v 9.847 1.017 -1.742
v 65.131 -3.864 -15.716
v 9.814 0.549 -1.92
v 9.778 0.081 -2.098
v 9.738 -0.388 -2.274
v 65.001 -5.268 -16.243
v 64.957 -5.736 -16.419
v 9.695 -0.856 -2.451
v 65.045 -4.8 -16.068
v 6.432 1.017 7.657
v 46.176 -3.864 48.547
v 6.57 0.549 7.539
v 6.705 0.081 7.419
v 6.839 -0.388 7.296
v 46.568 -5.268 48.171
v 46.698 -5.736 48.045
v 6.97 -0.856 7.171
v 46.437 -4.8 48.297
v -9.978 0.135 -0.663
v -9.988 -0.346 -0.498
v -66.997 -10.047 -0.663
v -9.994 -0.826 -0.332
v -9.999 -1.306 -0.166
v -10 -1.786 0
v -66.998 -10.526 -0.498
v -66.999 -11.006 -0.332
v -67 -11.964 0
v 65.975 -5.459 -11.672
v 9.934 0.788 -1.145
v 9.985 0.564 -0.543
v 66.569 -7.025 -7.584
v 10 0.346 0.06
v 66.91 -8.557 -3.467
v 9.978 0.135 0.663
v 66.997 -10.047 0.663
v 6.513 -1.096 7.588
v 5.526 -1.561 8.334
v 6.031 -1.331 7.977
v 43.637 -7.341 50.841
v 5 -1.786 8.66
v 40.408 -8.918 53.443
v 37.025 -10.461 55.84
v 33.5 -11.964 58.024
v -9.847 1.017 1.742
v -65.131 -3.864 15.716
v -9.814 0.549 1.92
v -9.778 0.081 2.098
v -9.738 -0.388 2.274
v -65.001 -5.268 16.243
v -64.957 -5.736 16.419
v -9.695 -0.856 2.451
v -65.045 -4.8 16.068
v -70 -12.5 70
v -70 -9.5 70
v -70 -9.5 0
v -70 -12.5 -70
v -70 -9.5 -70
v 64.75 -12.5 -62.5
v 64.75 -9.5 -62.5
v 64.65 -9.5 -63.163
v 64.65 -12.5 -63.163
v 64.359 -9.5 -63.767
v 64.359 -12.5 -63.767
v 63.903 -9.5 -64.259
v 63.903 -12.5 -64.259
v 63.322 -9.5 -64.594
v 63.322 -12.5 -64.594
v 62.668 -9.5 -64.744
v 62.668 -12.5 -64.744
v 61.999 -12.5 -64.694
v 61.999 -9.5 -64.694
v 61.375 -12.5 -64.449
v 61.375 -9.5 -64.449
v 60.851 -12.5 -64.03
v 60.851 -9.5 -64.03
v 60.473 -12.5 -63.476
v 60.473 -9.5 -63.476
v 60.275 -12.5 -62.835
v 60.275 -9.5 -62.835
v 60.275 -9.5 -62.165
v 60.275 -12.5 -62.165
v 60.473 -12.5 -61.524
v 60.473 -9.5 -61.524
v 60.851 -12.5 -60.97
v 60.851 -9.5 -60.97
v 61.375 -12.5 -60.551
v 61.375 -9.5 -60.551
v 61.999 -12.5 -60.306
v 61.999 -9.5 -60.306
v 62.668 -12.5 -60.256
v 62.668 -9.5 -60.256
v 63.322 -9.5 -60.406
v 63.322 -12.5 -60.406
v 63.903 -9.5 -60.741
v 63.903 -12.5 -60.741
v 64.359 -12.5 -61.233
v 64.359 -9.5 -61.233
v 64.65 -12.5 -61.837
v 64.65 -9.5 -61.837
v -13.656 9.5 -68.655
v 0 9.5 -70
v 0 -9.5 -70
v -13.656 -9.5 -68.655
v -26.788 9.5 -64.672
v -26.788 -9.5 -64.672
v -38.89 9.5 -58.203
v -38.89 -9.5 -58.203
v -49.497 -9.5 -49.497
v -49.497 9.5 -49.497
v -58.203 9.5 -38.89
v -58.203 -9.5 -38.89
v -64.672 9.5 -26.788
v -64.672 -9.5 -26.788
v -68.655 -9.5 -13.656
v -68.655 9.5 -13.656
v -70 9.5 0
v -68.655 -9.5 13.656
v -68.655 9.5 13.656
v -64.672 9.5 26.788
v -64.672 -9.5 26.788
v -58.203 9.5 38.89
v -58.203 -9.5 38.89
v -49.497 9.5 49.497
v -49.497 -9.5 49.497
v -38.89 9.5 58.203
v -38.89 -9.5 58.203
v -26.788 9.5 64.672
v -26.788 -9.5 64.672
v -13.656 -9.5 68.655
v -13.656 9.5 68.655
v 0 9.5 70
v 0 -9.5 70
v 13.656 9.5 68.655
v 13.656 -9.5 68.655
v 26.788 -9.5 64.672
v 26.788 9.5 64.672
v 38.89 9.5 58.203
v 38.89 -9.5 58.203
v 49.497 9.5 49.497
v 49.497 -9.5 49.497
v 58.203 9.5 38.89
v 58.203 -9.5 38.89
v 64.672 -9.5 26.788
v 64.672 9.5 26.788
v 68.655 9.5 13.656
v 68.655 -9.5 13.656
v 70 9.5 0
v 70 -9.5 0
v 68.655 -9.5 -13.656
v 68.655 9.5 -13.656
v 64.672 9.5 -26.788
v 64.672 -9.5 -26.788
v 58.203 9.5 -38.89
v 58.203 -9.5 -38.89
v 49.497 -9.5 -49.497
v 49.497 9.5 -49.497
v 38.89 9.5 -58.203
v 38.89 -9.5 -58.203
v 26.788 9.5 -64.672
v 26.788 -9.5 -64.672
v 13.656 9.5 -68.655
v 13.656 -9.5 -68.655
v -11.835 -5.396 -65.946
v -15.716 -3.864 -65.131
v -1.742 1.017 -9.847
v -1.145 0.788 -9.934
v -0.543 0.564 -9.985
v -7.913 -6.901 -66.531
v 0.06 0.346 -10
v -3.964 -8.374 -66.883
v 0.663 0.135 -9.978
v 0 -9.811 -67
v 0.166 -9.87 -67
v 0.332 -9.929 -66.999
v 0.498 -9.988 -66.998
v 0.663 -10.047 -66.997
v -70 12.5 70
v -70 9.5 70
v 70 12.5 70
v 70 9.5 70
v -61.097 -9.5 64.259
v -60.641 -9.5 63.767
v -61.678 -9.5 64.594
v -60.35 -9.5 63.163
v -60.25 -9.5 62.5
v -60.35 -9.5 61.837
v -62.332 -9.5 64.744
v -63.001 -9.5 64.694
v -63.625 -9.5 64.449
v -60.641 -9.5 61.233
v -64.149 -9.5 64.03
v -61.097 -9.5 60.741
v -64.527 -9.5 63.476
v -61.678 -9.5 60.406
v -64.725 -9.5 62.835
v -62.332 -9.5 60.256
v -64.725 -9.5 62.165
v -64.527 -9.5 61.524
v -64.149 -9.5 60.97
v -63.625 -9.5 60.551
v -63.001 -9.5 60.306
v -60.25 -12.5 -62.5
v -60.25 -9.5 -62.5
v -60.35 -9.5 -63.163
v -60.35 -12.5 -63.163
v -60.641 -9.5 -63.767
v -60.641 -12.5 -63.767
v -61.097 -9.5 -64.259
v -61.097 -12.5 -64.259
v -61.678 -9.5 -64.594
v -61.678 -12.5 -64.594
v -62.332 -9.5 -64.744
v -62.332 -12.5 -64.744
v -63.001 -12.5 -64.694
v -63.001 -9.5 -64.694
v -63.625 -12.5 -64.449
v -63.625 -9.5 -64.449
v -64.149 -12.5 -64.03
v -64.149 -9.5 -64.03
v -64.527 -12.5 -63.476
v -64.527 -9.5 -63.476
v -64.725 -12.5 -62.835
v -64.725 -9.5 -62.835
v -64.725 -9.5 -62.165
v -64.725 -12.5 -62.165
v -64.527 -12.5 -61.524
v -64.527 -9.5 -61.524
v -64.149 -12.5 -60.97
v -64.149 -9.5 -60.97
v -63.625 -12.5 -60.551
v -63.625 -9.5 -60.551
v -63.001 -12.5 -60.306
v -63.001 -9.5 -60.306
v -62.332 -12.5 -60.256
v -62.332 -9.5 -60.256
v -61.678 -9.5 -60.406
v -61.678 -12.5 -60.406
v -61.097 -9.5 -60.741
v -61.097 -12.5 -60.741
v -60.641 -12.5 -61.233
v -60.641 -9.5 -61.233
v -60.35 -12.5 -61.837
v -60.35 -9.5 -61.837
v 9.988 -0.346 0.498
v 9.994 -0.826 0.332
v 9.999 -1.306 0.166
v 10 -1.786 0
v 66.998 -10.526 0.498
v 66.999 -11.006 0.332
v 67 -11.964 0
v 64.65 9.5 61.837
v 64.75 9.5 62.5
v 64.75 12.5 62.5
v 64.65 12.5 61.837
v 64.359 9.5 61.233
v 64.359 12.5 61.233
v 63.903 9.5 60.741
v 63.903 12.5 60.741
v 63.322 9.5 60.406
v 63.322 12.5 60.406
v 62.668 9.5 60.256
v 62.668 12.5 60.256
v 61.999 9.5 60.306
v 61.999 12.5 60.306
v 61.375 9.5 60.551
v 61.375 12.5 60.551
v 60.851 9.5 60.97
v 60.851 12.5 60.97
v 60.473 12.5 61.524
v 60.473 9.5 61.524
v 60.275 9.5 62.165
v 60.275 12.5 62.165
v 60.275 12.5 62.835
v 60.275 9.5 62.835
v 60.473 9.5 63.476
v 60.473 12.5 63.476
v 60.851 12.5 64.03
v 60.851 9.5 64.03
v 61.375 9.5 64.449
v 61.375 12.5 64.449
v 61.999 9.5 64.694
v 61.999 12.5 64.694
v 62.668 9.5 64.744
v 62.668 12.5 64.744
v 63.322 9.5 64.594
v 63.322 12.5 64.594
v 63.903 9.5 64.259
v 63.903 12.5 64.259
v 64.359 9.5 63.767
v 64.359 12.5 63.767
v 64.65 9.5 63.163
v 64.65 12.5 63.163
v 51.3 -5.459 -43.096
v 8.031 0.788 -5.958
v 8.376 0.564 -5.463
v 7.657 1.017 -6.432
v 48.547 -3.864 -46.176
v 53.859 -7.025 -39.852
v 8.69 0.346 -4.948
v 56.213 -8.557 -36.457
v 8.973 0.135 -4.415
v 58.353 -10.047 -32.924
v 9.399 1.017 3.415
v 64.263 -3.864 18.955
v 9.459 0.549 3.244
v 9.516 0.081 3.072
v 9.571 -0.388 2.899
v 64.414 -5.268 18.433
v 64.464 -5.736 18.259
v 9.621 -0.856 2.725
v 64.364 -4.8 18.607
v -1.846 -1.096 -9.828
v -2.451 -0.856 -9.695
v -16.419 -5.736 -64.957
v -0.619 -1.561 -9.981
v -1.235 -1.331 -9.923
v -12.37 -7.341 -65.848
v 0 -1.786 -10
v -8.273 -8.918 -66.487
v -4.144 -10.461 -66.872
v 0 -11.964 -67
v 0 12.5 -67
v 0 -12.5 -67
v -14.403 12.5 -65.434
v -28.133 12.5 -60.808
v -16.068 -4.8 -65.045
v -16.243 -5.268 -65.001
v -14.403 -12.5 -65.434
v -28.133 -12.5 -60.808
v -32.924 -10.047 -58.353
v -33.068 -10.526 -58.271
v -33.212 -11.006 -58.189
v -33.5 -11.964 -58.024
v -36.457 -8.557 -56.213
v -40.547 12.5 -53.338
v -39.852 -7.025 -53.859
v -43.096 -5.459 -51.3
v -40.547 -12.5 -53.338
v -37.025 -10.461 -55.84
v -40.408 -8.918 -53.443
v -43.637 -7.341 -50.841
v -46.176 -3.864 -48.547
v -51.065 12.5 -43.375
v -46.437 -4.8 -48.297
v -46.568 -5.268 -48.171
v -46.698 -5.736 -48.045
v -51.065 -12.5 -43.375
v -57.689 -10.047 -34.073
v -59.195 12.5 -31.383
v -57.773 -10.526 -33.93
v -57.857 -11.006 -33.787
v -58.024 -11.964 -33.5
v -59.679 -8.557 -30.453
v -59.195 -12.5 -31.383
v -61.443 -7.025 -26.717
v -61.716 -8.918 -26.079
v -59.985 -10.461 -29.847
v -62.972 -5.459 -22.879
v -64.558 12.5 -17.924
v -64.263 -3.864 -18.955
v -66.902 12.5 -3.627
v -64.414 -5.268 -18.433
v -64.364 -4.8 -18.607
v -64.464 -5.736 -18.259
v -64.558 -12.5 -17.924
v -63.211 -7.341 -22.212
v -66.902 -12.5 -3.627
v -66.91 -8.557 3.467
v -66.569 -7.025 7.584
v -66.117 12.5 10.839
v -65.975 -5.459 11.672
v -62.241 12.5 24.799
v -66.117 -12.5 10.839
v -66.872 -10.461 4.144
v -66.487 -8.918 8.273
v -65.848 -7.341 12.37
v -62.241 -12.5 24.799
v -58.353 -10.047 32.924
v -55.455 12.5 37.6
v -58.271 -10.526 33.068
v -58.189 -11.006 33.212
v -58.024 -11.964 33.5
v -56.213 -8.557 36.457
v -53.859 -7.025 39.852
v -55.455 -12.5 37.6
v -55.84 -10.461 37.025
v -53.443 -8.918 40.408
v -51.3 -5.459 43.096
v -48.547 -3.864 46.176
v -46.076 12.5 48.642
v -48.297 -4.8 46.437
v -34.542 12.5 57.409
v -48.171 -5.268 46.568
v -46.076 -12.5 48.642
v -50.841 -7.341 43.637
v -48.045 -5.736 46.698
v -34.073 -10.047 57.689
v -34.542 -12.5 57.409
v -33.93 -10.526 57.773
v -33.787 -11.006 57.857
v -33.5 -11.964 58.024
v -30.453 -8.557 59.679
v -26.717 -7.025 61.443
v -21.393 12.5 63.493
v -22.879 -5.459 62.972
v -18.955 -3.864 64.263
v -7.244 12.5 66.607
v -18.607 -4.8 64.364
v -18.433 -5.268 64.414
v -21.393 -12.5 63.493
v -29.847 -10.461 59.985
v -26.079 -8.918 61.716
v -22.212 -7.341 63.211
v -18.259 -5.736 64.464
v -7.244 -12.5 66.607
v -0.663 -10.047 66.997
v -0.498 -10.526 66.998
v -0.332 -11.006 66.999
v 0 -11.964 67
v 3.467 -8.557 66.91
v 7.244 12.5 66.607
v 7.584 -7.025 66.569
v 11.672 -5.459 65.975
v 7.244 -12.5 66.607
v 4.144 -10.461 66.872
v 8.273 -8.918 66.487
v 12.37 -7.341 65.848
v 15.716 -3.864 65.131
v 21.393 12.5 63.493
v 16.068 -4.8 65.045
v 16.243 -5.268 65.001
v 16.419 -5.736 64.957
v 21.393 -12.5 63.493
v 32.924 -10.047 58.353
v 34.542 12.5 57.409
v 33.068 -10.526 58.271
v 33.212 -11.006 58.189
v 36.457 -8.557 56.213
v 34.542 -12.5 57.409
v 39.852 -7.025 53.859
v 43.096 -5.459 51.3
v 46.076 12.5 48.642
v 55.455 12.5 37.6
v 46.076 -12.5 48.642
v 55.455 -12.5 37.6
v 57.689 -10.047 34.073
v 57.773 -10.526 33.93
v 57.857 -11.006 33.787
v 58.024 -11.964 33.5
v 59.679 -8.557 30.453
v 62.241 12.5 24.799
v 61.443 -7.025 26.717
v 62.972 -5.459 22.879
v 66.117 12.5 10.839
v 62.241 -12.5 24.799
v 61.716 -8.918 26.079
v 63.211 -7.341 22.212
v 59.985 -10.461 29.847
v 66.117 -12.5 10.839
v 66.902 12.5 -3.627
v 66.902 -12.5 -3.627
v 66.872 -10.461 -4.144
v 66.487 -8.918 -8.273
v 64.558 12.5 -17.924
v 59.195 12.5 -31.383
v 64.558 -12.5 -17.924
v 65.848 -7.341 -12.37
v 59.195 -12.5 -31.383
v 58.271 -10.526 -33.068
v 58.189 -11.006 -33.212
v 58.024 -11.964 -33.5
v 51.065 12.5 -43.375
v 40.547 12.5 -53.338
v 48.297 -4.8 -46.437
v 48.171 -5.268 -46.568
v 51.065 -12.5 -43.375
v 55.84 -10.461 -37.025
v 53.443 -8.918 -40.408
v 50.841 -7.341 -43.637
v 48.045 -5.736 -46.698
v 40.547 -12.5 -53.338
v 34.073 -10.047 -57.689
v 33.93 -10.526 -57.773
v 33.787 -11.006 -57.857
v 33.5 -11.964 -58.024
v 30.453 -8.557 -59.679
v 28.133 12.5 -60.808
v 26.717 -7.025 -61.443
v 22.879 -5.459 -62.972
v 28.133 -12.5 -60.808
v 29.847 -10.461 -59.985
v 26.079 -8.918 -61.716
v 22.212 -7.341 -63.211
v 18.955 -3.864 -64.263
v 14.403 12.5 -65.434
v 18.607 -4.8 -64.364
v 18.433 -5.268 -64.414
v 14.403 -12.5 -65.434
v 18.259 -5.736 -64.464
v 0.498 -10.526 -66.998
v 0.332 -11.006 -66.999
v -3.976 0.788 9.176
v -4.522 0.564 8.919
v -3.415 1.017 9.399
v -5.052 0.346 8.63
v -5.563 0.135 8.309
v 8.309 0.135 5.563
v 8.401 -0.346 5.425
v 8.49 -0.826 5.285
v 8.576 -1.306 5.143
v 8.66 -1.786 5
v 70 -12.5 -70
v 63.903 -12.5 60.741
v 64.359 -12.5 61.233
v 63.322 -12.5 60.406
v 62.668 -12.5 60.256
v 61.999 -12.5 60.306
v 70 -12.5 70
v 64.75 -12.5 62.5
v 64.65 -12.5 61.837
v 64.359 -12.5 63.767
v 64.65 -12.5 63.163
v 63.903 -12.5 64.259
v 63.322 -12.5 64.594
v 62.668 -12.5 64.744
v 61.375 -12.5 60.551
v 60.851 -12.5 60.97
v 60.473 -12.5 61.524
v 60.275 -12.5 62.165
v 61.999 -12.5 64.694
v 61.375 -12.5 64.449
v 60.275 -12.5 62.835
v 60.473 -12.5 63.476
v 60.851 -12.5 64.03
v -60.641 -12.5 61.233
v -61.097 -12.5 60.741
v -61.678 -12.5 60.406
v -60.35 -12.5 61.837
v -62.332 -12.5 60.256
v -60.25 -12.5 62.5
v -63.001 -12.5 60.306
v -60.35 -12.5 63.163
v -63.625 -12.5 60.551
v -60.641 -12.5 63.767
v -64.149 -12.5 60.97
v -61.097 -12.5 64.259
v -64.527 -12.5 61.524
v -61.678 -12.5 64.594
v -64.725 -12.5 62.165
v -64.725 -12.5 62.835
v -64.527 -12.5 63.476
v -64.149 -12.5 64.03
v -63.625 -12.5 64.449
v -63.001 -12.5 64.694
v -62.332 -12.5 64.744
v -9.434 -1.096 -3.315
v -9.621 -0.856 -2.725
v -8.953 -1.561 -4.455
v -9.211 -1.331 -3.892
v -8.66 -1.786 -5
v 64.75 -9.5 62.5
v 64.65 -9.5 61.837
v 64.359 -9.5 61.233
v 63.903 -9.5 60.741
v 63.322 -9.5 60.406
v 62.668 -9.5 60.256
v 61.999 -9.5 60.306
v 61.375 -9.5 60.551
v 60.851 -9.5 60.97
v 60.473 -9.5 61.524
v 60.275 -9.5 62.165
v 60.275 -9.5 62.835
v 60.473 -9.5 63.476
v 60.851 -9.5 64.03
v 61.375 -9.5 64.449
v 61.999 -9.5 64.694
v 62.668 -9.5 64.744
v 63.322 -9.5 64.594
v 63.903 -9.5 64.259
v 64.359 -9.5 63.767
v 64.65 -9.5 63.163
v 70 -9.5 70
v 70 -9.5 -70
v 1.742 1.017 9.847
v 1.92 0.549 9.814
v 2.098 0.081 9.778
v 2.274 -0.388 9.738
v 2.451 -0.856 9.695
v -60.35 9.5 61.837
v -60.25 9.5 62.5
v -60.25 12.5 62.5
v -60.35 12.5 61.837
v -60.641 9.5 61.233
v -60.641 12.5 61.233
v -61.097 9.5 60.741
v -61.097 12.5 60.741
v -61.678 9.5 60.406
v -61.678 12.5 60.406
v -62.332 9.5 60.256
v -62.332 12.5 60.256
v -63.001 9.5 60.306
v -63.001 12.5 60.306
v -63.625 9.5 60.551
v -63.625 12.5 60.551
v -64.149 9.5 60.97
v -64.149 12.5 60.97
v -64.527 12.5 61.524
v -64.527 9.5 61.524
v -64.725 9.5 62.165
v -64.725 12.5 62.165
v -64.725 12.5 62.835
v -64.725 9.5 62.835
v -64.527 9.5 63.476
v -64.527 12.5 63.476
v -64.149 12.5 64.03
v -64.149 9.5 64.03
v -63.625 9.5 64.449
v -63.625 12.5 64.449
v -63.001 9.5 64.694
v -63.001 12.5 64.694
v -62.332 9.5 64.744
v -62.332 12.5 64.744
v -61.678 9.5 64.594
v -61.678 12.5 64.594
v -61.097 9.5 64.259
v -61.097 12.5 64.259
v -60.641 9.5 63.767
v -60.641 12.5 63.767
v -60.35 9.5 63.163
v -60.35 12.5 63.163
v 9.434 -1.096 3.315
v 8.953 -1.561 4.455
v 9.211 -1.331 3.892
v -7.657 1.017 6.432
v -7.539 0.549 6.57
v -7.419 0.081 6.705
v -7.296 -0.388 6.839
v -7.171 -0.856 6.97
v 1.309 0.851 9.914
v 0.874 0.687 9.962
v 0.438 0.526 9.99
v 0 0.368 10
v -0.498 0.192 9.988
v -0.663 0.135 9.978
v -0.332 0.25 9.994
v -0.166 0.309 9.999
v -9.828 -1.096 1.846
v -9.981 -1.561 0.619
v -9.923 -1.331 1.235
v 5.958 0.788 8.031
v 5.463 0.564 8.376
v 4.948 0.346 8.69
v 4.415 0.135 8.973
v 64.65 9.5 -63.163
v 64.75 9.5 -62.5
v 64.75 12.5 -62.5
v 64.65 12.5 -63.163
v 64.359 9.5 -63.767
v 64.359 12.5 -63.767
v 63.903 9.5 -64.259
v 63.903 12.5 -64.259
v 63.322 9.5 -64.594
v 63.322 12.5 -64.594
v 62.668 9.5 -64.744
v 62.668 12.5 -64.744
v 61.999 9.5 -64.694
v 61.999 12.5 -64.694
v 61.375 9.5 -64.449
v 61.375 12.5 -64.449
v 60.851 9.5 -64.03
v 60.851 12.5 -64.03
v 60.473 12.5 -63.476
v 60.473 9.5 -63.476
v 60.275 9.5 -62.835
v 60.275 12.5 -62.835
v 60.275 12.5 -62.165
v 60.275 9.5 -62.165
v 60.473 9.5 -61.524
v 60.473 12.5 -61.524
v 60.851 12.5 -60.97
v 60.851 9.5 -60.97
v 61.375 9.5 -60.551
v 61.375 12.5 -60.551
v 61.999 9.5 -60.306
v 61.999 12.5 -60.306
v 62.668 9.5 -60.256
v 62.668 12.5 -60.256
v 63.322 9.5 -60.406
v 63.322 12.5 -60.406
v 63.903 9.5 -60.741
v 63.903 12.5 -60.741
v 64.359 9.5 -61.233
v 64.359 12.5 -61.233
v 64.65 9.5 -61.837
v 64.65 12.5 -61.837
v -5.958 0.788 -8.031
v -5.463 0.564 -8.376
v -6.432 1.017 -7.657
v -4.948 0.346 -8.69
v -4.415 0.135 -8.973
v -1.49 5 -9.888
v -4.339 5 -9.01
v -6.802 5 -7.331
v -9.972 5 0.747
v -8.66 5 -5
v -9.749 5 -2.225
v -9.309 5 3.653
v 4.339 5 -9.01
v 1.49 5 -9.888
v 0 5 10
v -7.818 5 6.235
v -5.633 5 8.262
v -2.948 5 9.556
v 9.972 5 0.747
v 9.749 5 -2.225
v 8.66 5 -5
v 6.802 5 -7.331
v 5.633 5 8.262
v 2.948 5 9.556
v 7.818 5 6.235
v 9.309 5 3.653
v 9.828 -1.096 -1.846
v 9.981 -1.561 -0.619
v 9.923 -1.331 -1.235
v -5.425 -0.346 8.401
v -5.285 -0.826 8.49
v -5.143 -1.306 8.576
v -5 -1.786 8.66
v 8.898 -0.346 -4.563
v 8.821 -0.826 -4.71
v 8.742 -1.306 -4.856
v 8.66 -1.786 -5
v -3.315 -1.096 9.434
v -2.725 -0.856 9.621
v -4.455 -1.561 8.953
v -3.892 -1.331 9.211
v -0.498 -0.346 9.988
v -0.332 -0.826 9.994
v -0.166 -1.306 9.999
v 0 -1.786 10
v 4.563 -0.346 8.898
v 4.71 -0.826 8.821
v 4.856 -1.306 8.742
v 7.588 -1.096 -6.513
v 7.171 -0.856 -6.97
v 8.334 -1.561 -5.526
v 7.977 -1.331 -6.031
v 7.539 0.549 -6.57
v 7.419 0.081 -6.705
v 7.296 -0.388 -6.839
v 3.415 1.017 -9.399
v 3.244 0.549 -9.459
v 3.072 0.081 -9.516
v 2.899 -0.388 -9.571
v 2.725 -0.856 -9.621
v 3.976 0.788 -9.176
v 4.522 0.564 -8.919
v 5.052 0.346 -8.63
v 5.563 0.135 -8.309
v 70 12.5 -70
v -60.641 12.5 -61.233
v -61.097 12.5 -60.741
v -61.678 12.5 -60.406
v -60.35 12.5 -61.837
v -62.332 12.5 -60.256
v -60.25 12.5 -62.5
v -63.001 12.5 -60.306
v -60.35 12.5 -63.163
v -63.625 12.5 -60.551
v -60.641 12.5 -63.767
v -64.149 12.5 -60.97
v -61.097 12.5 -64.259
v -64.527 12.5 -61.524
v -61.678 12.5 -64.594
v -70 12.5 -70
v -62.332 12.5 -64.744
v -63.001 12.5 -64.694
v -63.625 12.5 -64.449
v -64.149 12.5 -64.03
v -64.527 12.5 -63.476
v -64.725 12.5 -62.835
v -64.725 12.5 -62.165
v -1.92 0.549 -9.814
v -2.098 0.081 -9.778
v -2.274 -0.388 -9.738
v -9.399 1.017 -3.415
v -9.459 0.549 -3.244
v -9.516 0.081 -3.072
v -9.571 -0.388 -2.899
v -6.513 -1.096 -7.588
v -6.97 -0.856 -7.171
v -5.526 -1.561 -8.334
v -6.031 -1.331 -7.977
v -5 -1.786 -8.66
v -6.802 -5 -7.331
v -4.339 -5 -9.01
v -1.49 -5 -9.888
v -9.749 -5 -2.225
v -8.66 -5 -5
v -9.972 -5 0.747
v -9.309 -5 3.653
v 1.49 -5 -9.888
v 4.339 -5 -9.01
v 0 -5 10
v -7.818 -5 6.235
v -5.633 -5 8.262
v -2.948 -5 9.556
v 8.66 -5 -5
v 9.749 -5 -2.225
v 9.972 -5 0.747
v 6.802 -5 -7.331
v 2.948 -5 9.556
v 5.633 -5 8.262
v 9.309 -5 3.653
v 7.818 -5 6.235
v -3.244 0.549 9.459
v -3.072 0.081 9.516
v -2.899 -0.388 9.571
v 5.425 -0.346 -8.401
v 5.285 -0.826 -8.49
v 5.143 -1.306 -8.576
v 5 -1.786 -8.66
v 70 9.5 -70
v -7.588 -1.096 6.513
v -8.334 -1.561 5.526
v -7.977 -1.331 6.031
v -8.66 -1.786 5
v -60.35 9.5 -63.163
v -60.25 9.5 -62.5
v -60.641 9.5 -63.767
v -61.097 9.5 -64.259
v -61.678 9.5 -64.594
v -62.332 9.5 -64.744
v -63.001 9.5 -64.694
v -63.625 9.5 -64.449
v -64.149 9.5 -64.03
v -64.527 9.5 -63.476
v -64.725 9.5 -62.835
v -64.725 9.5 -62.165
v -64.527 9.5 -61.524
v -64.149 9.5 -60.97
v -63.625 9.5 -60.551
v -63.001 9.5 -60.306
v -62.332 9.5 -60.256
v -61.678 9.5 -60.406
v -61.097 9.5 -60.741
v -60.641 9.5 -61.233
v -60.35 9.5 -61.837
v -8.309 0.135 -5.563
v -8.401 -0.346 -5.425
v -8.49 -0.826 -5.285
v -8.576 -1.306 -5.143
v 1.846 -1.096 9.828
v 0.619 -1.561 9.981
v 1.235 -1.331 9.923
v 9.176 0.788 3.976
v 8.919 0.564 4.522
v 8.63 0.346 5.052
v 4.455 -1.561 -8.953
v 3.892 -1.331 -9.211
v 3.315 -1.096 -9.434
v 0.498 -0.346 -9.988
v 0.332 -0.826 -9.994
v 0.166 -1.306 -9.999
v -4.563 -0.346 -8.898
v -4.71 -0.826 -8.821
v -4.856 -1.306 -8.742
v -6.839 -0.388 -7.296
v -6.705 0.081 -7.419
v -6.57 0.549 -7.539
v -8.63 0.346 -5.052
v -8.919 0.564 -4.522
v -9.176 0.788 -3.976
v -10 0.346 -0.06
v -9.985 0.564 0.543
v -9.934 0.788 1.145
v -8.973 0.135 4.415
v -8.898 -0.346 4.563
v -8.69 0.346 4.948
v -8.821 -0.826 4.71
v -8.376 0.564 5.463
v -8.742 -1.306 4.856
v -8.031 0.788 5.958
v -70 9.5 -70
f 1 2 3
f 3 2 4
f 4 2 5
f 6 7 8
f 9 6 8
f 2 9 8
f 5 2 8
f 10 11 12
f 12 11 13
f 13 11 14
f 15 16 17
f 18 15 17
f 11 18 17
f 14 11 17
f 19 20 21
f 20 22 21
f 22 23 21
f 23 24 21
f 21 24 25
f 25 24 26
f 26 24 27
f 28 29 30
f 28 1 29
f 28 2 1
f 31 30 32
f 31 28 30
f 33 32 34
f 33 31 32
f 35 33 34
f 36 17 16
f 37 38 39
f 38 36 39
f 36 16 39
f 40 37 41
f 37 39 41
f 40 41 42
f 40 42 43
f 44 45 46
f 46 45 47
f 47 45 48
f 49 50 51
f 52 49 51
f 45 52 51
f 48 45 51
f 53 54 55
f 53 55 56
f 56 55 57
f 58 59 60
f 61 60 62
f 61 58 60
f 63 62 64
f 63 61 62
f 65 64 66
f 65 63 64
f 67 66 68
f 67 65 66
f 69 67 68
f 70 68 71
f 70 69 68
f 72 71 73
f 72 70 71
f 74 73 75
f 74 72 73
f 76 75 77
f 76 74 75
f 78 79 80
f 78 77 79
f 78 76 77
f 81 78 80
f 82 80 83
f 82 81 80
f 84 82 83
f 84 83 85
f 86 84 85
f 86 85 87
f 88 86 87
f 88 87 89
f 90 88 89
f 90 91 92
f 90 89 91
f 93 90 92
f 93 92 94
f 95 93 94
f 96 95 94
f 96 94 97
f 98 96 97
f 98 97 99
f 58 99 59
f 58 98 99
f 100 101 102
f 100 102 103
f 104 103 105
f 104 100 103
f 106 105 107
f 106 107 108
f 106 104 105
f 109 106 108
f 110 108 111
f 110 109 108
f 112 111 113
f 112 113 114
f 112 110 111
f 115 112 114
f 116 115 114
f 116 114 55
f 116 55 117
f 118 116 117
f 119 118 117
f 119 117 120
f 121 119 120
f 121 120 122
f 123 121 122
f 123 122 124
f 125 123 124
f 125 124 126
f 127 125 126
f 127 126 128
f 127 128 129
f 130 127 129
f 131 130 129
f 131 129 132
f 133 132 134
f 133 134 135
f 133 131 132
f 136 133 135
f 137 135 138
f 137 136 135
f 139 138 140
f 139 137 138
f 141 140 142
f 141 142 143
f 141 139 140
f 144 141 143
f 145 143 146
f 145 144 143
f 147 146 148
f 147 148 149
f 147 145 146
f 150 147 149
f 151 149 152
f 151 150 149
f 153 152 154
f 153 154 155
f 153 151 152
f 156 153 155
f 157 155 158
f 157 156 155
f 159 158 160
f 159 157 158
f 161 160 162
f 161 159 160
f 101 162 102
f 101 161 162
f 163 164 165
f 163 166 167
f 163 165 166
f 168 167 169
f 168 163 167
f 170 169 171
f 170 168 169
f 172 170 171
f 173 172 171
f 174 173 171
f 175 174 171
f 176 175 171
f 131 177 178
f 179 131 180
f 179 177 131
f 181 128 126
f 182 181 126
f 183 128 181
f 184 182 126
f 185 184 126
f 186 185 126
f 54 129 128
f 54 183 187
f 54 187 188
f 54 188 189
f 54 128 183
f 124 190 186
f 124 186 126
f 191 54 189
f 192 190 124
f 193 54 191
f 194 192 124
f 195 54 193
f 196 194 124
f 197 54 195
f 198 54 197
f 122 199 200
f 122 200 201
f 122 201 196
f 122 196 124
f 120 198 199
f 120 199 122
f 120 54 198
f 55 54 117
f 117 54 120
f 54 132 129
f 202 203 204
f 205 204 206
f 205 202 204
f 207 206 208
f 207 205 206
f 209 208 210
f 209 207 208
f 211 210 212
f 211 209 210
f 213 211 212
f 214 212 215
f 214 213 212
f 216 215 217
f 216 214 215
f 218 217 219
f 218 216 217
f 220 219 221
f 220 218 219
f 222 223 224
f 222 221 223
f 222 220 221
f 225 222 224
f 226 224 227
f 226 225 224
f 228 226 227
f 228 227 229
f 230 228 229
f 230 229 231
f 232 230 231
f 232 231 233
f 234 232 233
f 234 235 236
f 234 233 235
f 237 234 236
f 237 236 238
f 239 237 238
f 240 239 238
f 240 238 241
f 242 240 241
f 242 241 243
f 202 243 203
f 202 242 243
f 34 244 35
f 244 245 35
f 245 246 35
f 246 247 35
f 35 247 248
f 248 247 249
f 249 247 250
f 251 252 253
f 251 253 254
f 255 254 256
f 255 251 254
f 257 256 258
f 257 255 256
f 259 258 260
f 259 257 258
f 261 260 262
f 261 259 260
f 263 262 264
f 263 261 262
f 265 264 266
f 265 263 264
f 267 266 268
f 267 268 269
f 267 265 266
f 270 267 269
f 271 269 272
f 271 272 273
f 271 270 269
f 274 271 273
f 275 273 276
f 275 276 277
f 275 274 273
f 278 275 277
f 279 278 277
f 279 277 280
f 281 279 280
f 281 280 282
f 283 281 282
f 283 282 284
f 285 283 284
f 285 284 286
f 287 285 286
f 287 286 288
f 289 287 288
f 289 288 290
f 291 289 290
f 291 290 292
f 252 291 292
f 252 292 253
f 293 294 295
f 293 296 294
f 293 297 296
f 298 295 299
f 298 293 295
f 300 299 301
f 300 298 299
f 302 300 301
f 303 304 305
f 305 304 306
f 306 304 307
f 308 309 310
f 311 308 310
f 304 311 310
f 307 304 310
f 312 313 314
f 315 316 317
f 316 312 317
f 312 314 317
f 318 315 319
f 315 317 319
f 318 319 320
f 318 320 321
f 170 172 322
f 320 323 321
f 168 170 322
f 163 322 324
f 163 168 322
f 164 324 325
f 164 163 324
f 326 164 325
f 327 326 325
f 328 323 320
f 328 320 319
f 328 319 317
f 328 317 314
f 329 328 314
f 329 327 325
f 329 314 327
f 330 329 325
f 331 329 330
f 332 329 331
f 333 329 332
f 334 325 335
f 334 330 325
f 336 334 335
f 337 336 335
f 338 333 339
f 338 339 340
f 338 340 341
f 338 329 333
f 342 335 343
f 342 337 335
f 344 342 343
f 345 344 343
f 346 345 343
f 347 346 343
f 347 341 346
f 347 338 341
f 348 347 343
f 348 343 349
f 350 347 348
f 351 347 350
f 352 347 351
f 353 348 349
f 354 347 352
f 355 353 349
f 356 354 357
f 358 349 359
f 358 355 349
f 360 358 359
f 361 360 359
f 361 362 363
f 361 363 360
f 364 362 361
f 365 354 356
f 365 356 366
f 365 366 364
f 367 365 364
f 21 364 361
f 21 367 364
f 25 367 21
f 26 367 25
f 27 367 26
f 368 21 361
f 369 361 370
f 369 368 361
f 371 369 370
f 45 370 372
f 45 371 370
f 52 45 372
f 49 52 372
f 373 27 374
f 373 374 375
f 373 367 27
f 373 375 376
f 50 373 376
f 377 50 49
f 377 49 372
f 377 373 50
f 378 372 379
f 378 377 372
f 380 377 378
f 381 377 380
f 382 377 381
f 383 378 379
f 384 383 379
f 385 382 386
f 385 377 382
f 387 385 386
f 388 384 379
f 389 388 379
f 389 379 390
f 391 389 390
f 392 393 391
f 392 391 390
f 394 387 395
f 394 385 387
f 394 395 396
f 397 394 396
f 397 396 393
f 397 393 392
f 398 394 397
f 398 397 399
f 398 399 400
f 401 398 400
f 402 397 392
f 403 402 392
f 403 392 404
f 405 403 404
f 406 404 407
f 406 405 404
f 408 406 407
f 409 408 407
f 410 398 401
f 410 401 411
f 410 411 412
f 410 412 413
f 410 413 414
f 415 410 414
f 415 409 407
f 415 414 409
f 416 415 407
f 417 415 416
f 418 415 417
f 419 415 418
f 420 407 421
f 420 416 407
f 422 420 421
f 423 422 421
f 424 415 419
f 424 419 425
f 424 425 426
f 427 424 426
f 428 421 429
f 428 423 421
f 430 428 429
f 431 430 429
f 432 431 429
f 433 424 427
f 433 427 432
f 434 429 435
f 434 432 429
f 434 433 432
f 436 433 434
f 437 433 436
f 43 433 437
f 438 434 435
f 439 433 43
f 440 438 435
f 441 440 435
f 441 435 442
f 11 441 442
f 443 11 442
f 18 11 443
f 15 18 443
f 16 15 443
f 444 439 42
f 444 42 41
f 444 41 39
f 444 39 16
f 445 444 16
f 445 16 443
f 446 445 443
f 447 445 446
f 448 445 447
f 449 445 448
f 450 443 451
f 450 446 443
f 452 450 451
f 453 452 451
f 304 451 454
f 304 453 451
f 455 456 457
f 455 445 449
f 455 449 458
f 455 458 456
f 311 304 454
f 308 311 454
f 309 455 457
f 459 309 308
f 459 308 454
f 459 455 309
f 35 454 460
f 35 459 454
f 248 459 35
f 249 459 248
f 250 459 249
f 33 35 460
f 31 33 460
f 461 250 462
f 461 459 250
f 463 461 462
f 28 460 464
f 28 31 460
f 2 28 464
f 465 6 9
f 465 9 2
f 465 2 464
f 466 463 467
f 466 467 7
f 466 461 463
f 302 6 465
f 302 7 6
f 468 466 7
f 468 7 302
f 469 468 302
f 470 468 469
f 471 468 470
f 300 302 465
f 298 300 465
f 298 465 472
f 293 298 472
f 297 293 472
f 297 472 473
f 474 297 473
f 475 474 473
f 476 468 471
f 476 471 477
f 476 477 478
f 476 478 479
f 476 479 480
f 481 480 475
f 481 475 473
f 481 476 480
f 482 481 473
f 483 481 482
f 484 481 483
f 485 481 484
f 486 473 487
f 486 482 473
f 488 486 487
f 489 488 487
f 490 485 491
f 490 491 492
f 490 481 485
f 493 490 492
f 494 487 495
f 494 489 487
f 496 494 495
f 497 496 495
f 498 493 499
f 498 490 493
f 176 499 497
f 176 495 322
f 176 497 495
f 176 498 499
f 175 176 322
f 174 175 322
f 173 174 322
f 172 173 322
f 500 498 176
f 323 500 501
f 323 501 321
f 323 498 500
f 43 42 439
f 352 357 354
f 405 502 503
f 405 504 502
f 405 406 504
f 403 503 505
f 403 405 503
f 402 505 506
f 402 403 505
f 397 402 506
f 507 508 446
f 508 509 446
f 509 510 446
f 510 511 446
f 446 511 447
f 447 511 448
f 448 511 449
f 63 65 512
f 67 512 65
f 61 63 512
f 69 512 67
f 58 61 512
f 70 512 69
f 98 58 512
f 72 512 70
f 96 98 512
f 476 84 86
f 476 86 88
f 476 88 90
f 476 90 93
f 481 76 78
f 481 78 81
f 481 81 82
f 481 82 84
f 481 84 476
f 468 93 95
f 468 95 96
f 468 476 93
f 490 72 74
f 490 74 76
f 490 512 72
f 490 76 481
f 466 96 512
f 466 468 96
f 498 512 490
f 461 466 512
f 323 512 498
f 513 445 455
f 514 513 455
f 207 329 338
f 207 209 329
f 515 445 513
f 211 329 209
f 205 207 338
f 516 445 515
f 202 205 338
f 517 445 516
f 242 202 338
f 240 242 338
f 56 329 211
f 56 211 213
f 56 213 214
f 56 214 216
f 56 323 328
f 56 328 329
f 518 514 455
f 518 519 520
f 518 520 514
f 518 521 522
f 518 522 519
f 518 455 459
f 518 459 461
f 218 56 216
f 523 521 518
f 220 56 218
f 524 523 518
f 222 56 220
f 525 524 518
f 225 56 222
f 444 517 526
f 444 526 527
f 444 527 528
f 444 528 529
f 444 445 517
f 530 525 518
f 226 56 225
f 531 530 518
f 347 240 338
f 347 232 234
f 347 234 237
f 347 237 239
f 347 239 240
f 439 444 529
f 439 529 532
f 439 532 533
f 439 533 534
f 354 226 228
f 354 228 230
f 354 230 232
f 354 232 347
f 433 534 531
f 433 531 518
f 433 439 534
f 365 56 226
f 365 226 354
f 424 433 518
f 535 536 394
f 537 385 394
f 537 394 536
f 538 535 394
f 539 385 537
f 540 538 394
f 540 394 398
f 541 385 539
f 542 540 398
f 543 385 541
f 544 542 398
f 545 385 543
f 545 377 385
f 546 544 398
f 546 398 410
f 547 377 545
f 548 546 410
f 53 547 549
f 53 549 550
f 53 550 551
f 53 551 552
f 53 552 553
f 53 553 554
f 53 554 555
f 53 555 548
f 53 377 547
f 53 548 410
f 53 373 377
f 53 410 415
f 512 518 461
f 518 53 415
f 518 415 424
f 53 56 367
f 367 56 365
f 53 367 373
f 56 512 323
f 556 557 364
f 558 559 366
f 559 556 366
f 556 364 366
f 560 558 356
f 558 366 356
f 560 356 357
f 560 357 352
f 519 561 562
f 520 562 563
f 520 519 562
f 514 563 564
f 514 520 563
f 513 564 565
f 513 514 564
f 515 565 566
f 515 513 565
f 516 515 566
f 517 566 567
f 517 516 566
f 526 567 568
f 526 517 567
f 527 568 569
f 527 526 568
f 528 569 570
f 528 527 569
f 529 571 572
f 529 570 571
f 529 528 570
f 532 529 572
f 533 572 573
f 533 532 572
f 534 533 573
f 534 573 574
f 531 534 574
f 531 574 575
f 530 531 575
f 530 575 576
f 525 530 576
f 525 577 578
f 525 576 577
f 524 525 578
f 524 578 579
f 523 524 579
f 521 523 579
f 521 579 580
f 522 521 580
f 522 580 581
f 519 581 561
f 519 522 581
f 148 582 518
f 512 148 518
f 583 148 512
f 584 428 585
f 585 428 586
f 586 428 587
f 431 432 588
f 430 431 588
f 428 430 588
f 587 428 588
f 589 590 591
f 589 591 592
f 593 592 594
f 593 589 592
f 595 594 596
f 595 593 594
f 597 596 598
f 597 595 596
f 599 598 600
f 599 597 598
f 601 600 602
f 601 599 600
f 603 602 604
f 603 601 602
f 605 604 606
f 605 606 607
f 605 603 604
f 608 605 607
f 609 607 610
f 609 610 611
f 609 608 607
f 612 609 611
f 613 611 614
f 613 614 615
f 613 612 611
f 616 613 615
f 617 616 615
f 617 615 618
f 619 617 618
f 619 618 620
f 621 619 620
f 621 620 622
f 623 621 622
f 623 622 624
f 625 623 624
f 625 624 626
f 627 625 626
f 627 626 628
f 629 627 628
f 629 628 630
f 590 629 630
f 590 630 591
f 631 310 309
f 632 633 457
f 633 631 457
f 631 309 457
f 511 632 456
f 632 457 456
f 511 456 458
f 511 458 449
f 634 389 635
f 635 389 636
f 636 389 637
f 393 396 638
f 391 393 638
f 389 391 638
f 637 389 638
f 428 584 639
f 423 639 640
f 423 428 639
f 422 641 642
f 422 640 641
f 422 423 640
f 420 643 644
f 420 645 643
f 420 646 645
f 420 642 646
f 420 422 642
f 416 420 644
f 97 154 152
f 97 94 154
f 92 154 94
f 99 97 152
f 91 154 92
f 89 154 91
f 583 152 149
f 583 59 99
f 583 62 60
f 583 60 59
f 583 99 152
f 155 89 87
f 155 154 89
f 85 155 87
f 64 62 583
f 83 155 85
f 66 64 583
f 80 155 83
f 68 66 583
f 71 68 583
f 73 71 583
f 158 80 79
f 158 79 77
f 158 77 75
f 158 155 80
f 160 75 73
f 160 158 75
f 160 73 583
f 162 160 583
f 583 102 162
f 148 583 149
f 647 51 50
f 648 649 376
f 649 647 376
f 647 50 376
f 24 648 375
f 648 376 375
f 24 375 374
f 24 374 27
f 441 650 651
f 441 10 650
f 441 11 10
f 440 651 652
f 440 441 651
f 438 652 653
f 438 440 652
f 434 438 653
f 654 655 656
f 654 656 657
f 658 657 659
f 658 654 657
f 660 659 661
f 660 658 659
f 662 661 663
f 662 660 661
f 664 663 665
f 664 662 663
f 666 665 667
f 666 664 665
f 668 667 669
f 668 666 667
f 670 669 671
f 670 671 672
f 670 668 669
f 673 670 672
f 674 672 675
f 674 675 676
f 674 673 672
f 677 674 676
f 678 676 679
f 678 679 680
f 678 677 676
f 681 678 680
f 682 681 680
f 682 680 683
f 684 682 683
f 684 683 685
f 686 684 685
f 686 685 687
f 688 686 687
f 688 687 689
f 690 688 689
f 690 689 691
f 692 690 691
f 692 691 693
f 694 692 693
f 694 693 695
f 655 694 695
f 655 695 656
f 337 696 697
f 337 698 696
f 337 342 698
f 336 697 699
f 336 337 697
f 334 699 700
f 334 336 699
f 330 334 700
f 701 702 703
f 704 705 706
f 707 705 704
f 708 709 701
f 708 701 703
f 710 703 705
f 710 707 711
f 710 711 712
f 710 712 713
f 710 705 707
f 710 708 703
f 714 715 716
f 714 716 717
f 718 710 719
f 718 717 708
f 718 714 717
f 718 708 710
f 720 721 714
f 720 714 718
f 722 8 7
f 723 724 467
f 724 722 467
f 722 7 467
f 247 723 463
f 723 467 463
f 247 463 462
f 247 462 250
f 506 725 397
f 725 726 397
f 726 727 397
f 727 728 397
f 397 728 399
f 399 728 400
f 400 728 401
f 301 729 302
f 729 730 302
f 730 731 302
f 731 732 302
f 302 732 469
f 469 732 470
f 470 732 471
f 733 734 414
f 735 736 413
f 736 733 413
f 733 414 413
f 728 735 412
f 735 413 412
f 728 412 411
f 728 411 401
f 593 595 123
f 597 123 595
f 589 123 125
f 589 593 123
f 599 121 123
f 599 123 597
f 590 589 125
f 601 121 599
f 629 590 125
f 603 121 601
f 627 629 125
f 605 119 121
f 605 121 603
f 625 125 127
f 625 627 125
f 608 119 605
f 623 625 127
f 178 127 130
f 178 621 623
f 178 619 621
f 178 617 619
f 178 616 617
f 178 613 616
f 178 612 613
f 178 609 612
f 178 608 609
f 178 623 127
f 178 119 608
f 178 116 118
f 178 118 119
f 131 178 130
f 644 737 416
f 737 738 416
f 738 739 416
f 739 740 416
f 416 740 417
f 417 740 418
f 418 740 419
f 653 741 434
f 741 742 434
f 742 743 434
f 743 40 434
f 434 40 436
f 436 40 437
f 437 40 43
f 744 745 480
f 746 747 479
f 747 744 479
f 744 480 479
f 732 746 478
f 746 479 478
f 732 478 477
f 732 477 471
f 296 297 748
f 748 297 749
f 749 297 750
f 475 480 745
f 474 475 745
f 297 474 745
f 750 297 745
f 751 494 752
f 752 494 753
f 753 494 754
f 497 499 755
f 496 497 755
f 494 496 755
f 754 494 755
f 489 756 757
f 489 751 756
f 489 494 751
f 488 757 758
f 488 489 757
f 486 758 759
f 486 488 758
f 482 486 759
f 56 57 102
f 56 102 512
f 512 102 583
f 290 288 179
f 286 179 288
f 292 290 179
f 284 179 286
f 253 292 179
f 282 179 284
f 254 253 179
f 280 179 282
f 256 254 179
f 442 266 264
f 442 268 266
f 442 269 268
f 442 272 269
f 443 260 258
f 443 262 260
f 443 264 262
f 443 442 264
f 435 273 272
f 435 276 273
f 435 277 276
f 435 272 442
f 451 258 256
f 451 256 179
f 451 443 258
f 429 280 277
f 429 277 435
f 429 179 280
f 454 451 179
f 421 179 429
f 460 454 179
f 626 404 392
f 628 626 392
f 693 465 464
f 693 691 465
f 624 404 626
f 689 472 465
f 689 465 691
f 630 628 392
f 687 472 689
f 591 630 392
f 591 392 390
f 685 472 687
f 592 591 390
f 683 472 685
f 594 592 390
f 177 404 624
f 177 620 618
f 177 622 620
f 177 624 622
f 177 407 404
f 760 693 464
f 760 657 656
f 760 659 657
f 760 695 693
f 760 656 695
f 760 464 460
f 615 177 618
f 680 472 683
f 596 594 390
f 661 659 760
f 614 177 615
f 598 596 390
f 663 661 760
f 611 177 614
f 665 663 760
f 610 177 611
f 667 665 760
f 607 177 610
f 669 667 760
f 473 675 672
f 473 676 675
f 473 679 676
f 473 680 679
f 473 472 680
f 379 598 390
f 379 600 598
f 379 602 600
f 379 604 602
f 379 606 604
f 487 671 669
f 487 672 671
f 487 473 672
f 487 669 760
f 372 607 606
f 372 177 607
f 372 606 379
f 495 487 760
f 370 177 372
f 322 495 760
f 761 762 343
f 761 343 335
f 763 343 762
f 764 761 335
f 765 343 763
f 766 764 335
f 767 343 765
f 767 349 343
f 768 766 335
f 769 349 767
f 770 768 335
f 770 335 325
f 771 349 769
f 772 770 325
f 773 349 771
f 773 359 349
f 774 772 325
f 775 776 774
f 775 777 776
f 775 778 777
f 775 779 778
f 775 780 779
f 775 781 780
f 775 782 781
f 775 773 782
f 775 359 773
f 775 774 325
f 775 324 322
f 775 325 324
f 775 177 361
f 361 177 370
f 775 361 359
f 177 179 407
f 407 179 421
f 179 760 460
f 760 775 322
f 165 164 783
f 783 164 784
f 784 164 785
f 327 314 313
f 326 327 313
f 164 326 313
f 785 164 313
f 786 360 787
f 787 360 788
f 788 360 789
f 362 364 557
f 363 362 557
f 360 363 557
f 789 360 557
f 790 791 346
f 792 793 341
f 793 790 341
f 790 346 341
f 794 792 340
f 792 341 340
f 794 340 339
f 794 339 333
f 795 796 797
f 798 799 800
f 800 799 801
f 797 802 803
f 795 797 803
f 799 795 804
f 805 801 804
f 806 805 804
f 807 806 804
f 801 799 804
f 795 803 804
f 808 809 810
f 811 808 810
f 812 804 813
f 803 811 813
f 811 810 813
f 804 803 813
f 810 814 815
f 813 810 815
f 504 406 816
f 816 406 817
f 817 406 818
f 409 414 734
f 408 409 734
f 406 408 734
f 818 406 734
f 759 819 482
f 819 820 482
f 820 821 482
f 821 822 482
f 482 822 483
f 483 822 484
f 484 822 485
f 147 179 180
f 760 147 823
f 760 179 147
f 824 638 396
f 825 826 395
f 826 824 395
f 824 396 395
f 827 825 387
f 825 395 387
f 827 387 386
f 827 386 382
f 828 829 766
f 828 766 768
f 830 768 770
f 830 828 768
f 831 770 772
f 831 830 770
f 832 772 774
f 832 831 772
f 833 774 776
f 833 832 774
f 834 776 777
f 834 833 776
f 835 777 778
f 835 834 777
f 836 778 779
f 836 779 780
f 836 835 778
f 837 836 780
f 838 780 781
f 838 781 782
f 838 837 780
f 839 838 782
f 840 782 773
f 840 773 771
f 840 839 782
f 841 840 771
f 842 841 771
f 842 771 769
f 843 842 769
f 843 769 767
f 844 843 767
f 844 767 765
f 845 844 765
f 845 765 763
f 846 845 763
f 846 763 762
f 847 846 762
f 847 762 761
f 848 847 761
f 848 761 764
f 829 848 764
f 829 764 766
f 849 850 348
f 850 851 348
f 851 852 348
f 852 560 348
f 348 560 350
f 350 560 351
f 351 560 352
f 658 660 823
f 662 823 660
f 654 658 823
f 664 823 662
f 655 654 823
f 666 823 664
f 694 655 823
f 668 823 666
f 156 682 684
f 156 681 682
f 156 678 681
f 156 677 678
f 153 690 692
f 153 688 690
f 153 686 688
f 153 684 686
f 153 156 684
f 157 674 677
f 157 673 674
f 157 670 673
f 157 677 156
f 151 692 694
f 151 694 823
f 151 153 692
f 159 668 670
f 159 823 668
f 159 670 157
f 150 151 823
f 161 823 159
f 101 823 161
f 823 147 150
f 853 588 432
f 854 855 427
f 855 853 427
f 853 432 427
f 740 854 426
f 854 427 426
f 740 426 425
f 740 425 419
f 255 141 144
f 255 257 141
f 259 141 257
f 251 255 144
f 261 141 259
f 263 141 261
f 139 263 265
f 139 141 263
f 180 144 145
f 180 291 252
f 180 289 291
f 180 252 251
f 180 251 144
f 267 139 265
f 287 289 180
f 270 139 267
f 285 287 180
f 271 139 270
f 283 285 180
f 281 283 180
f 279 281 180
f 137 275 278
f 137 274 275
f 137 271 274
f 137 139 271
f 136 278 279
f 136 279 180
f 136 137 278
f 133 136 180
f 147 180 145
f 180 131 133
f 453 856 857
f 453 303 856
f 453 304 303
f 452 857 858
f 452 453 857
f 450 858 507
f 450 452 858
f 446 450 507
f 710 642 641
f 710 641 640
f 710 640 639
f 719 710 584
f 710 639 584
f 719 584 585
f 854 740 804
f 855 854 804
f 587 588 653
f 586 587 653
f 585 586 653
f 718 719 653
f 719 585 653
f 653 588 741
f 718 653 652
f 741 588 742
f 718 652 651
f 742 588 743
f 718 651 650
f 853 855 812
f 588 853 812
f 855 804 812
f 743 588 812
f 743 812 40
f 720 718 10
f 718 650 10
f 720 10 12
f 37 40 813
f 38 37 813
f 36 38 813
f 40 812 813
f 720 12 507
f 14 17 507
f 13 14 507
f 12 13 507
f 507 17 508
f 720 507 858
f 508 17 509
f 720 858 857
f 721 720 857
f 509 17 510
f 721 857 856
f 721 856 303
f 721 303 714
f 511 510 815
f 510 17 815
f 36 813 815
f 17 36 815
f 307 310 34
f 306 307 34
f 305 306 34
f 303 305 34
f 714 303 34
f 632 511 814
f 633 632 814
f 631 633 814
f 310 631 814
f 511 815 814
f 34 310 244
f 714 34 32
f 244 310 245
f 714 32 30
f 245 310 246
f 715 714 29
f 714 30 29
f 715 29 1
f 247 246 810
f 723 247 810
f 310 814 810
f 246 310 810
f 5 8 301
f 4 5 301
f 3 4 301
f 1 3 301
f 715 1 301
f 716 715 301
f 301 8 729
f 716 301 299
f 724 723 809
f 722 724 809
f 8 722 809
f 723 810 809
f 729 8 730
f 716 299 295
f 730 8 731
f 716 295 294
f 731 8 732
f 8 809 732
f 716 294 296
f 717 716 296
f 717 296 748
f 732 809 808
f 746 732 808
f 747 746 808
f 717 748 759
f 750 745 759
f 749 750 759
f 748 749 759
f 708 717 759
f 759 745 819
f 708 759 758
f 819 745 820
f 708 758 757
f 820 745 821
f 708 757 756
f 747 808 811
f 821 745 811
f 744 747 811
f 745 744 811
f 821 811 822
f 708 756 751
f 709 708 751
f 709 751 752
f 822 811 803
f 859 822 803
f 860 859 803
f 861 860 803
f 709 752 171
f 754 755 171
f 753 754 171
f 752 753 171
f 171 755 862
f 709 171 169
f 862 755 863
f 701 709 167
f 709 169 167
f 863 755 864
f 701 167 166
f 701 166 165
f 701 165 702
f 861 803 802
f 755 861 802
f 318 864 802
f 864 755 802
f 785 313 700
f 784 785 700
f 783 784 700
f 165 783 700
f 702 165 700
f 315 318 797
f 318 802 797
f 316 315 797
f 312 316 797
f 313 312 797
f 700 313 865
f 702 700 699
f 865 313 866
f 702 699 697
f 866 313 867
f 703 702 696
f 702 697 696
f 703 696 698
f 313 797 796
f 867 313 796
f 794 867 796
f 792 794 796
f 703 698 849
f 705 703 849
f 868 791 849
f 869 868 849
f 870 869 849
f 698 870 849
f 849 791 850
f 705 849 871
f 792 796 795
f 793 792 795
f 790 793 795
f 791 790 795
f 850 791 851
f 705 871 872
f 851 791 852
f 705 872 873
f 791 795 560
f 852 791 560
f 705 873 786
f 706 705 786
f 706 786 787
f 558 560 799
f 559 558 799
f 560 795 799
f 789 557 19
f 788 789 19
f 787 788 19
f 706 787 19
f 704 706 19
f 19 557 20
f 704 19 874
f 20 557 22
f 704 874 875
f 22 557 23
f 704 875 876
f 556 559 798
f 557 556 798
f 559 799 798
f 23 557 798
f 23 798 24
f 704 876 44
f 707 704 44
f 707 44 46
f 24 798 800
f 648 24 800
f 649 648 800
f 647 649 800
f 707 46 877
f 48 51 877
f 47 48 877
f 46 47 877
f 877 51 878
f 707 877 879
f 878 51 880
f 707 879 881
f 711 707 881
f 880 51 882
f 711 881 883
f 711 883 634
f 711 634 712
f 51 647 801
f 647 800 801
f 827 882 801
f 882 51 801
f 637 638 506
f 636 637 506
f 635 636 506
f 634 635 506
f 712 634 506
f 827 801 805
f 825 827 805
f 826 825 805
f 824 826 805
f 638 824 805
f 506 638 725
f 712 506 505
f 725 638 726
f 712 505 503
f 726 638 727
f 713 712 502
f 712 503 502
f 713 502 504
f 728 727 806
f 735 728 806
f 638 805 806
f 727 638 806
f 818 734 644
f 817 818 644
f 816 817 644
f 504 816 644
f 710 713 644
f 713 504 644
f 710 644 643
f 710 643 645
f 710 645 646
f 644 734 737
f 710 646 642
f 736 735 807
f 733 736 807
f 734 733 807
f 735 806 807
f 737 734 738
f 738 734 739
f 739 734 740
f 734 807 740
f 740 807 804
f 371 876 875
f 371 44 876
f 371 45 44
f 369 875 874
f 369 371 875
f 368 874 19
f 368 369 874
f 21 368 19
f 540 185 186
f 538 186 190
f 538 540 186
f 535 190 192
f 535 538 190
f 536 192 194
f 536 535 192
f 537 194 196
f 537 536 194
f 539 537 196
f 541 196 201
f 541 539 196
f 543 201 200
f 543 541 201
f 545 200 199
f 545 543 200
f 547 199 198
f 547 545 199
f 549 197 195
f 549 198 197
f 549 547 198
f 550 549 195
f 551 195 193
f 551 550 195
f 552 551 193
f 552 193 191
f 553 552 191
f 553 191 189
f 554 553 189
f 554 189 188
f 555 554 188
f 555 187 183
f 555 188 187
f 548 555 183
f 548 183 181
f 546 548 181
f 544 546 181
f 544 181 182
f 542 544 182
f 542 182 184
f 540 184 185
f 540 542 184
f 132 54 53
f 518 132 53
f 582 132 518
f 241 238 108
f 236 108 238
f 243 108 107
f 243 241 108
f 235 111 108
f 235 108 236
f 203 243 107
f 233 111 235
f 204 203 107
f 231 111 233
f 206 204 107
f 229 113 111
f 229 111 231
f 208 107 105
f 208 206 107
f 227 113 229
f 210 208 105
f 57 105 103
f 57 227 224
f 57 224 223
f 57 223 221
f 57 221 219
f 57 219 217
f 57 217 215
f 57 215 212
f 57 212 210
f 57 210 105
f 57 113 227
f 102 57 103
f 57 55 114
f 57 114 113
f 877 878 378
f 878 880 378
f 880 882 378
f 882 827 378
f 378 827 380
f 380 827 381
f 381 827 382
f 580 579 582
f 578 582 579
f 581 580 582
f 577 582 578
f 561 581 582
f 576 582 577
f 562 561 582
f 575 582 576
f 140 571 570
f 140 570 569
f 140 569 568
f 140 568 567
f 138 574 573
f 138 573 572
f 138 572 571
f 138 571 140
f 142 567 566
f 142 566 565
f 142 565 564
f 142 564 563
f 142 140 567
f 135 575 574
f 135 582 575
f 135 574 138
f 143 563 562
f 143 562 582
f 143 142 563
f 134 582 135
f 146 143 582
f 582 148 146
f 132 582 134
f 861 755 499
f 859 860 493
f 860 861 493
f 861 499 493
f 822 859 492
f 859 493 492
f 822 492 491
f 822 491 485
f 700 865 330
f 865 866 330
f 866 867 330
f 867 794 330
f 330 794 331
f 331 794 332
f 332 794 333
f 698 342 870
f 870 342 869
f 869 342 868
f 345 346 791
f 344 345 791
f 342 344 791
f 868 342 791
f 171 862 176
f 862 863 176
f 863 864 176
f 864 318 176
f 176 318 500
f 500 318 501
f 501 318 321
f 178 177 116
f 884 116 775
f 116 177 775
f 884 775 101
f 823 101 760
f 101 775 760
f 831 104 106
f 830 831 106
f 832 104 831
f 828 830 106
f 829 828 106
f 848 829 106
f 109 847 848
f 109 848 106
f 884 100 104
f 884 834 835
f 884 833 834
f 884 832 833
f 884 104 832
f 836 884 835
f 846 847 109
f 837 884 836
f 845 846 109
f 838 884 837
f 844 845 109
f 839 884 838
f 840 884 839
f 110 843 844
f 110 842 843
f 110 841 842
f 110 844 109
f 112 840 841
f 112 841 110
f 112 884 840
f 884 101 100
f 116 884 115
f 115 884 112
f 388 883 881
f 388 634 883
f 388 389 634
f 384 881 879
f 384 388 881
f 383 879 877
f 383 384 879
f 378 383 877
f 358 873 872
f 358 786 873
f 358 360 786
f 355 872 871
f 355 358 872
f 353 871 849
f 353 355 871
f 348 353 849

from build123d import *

# Parameters (mm, degrees)
SKETCH2_OUTSIDE_W         = 258.79
SKETCH2_OUTSIDE_H         = 258.79
SKETCH2_OUTSIDE_W_2       = 140
SKETCH2_OUTSIDE_H_2       = 140
SQUARE_SHAPE_CUTOUT_DEPTH = 144.614066163
MOUNTING_HOLES_START      = -12.5
MOUNTING_HOLES_OUTLINE_R  = 2.25
MOUNTING_HOLES_DEPTH      = 25
FAN_WING_DEPTH            = 2
BOSS_EXTRUDE2_DEPTH       = 5
BOSS_EXTRUDE2_DEPTH_BACK  = 5
SKETCH7_R                 = 10
CIRPATTERN3_COUNT         = 12


# Read off the part's stored shape, not the designer's step: mounting_holes
with BuildPart() as part:
    # Sketch1 → body (revolve)
    with BuildSketch(Plane.XY, mode=Mode.PRIVATE) as body_sk:
        Polygon((67, -12.5), (100, -12.5), (100, -9.5), (70, -9.5), (70, 9.5), (100, 9.5), (100, 12.5), (67, 12.5), align=None)
    revolve(body_sk.sketch.rotate(Axis((0, 0, 0), (0, 1, 0)), 90), axis=Axis((0, 0, 0), (0, 1, 0)))

    # Sketch2 outside → square_shape_cutout (cut, through all)
    with BuildSketch(Plane(origin=(0, 12.5, 0), x_dir=(1, 0, 0), z_dir=(0, 1, 0))):
        Rectangle(SKETCH2_OUTSIDE_W, SKETCH2_OUTSIDE_H)
        Rectangle(SKETCH2_OUTSIDE_W_2, SKETCH2_OUTSIDE_H_2, mode=Mode.SUBTRACT)
    extrude(amount=-SQUARE_SHAPE_CUTOUT_DEPTH, mode=Mode.SUBTRACT)

    # mounting_holes outline → mounting_holes (cut)
    with BuildSketch(Plane(origin=(0, 0, 0), x_dir=(1, 0, 0), z_dir=(0, 1, 0)).offset(MOUNTING_HOLES_START)):
        with Locations((62.5, 62.5)):
            Circle(MOUNTING_HOLES_OUTLINE_R)
        with Locations((-62.5, -62.5)):
            Circle(MOUNTING_HOLES_OUTLINE_R)
        with Locations((62.5, -62.5)):
            Circle(MOUNTING_HOLES_OUTLINE_R)
        with Locations((-62.5, 62.5)):
            Circle(MOUNTING_HOLES_OUTLINE_R)
    extrude(amount=MOUNTING_HOLES_DEPTH, mode=Mode.SUBTRACT)

    # Sketch6 → fan_wing (add)
    with BuildSketch(Plane(origin=(0, 0, 0), x_dir=(0.9433922826162455, -0.3265140162330641, 0.058306074327332945), z_dir=(0.33167906340332987, 0.9287013775293232, -0.16583953170166502))):
        with BuildLine():
            Line((0, 0), (0, 68.153777936))
            ThreePointArc((0, 68.153777936), (-8.870280209, 67.459789157), (-17.540404137, 65.461679426))
            Line((-17.540404137, 65.461679426), (0, 0))
        make_face()
    fan_wing = extrude(amount=FAN_WING_DEPTH)

    # Sketch7 → Boss-Extrude2 (add, two sides: drawn at the far end of the back side and taken through both)
    with BuildSketch(Plane(origin=(0, 0, 0), x_dir=(1, 0, 0), z_dir=(0, 1, 0)).offset(-BOSS_EXTRUDE2_DEPTH_BACK)):
        with Locations(Location((0, 0, 0), (0, 0, 270))):
            Circle(SKETCH7_R)
    extrude(amount=BOSS_EXTRUDE2_DEPTH + BOSS_EXTRUDE2_DEPTH_BACK)

    # CirPattern3: fan_wing ×12 about axis
    cirpattern3_axis = Axis((0, 0, 0), (0, 1, 0))
    for i in range(1, CIRPATTERN3_COUNT):
        add(fan_wing.rotate(cirpattern3_axis, i * 360 / CIRPATTERN3_COUNT))


solid = part.part
